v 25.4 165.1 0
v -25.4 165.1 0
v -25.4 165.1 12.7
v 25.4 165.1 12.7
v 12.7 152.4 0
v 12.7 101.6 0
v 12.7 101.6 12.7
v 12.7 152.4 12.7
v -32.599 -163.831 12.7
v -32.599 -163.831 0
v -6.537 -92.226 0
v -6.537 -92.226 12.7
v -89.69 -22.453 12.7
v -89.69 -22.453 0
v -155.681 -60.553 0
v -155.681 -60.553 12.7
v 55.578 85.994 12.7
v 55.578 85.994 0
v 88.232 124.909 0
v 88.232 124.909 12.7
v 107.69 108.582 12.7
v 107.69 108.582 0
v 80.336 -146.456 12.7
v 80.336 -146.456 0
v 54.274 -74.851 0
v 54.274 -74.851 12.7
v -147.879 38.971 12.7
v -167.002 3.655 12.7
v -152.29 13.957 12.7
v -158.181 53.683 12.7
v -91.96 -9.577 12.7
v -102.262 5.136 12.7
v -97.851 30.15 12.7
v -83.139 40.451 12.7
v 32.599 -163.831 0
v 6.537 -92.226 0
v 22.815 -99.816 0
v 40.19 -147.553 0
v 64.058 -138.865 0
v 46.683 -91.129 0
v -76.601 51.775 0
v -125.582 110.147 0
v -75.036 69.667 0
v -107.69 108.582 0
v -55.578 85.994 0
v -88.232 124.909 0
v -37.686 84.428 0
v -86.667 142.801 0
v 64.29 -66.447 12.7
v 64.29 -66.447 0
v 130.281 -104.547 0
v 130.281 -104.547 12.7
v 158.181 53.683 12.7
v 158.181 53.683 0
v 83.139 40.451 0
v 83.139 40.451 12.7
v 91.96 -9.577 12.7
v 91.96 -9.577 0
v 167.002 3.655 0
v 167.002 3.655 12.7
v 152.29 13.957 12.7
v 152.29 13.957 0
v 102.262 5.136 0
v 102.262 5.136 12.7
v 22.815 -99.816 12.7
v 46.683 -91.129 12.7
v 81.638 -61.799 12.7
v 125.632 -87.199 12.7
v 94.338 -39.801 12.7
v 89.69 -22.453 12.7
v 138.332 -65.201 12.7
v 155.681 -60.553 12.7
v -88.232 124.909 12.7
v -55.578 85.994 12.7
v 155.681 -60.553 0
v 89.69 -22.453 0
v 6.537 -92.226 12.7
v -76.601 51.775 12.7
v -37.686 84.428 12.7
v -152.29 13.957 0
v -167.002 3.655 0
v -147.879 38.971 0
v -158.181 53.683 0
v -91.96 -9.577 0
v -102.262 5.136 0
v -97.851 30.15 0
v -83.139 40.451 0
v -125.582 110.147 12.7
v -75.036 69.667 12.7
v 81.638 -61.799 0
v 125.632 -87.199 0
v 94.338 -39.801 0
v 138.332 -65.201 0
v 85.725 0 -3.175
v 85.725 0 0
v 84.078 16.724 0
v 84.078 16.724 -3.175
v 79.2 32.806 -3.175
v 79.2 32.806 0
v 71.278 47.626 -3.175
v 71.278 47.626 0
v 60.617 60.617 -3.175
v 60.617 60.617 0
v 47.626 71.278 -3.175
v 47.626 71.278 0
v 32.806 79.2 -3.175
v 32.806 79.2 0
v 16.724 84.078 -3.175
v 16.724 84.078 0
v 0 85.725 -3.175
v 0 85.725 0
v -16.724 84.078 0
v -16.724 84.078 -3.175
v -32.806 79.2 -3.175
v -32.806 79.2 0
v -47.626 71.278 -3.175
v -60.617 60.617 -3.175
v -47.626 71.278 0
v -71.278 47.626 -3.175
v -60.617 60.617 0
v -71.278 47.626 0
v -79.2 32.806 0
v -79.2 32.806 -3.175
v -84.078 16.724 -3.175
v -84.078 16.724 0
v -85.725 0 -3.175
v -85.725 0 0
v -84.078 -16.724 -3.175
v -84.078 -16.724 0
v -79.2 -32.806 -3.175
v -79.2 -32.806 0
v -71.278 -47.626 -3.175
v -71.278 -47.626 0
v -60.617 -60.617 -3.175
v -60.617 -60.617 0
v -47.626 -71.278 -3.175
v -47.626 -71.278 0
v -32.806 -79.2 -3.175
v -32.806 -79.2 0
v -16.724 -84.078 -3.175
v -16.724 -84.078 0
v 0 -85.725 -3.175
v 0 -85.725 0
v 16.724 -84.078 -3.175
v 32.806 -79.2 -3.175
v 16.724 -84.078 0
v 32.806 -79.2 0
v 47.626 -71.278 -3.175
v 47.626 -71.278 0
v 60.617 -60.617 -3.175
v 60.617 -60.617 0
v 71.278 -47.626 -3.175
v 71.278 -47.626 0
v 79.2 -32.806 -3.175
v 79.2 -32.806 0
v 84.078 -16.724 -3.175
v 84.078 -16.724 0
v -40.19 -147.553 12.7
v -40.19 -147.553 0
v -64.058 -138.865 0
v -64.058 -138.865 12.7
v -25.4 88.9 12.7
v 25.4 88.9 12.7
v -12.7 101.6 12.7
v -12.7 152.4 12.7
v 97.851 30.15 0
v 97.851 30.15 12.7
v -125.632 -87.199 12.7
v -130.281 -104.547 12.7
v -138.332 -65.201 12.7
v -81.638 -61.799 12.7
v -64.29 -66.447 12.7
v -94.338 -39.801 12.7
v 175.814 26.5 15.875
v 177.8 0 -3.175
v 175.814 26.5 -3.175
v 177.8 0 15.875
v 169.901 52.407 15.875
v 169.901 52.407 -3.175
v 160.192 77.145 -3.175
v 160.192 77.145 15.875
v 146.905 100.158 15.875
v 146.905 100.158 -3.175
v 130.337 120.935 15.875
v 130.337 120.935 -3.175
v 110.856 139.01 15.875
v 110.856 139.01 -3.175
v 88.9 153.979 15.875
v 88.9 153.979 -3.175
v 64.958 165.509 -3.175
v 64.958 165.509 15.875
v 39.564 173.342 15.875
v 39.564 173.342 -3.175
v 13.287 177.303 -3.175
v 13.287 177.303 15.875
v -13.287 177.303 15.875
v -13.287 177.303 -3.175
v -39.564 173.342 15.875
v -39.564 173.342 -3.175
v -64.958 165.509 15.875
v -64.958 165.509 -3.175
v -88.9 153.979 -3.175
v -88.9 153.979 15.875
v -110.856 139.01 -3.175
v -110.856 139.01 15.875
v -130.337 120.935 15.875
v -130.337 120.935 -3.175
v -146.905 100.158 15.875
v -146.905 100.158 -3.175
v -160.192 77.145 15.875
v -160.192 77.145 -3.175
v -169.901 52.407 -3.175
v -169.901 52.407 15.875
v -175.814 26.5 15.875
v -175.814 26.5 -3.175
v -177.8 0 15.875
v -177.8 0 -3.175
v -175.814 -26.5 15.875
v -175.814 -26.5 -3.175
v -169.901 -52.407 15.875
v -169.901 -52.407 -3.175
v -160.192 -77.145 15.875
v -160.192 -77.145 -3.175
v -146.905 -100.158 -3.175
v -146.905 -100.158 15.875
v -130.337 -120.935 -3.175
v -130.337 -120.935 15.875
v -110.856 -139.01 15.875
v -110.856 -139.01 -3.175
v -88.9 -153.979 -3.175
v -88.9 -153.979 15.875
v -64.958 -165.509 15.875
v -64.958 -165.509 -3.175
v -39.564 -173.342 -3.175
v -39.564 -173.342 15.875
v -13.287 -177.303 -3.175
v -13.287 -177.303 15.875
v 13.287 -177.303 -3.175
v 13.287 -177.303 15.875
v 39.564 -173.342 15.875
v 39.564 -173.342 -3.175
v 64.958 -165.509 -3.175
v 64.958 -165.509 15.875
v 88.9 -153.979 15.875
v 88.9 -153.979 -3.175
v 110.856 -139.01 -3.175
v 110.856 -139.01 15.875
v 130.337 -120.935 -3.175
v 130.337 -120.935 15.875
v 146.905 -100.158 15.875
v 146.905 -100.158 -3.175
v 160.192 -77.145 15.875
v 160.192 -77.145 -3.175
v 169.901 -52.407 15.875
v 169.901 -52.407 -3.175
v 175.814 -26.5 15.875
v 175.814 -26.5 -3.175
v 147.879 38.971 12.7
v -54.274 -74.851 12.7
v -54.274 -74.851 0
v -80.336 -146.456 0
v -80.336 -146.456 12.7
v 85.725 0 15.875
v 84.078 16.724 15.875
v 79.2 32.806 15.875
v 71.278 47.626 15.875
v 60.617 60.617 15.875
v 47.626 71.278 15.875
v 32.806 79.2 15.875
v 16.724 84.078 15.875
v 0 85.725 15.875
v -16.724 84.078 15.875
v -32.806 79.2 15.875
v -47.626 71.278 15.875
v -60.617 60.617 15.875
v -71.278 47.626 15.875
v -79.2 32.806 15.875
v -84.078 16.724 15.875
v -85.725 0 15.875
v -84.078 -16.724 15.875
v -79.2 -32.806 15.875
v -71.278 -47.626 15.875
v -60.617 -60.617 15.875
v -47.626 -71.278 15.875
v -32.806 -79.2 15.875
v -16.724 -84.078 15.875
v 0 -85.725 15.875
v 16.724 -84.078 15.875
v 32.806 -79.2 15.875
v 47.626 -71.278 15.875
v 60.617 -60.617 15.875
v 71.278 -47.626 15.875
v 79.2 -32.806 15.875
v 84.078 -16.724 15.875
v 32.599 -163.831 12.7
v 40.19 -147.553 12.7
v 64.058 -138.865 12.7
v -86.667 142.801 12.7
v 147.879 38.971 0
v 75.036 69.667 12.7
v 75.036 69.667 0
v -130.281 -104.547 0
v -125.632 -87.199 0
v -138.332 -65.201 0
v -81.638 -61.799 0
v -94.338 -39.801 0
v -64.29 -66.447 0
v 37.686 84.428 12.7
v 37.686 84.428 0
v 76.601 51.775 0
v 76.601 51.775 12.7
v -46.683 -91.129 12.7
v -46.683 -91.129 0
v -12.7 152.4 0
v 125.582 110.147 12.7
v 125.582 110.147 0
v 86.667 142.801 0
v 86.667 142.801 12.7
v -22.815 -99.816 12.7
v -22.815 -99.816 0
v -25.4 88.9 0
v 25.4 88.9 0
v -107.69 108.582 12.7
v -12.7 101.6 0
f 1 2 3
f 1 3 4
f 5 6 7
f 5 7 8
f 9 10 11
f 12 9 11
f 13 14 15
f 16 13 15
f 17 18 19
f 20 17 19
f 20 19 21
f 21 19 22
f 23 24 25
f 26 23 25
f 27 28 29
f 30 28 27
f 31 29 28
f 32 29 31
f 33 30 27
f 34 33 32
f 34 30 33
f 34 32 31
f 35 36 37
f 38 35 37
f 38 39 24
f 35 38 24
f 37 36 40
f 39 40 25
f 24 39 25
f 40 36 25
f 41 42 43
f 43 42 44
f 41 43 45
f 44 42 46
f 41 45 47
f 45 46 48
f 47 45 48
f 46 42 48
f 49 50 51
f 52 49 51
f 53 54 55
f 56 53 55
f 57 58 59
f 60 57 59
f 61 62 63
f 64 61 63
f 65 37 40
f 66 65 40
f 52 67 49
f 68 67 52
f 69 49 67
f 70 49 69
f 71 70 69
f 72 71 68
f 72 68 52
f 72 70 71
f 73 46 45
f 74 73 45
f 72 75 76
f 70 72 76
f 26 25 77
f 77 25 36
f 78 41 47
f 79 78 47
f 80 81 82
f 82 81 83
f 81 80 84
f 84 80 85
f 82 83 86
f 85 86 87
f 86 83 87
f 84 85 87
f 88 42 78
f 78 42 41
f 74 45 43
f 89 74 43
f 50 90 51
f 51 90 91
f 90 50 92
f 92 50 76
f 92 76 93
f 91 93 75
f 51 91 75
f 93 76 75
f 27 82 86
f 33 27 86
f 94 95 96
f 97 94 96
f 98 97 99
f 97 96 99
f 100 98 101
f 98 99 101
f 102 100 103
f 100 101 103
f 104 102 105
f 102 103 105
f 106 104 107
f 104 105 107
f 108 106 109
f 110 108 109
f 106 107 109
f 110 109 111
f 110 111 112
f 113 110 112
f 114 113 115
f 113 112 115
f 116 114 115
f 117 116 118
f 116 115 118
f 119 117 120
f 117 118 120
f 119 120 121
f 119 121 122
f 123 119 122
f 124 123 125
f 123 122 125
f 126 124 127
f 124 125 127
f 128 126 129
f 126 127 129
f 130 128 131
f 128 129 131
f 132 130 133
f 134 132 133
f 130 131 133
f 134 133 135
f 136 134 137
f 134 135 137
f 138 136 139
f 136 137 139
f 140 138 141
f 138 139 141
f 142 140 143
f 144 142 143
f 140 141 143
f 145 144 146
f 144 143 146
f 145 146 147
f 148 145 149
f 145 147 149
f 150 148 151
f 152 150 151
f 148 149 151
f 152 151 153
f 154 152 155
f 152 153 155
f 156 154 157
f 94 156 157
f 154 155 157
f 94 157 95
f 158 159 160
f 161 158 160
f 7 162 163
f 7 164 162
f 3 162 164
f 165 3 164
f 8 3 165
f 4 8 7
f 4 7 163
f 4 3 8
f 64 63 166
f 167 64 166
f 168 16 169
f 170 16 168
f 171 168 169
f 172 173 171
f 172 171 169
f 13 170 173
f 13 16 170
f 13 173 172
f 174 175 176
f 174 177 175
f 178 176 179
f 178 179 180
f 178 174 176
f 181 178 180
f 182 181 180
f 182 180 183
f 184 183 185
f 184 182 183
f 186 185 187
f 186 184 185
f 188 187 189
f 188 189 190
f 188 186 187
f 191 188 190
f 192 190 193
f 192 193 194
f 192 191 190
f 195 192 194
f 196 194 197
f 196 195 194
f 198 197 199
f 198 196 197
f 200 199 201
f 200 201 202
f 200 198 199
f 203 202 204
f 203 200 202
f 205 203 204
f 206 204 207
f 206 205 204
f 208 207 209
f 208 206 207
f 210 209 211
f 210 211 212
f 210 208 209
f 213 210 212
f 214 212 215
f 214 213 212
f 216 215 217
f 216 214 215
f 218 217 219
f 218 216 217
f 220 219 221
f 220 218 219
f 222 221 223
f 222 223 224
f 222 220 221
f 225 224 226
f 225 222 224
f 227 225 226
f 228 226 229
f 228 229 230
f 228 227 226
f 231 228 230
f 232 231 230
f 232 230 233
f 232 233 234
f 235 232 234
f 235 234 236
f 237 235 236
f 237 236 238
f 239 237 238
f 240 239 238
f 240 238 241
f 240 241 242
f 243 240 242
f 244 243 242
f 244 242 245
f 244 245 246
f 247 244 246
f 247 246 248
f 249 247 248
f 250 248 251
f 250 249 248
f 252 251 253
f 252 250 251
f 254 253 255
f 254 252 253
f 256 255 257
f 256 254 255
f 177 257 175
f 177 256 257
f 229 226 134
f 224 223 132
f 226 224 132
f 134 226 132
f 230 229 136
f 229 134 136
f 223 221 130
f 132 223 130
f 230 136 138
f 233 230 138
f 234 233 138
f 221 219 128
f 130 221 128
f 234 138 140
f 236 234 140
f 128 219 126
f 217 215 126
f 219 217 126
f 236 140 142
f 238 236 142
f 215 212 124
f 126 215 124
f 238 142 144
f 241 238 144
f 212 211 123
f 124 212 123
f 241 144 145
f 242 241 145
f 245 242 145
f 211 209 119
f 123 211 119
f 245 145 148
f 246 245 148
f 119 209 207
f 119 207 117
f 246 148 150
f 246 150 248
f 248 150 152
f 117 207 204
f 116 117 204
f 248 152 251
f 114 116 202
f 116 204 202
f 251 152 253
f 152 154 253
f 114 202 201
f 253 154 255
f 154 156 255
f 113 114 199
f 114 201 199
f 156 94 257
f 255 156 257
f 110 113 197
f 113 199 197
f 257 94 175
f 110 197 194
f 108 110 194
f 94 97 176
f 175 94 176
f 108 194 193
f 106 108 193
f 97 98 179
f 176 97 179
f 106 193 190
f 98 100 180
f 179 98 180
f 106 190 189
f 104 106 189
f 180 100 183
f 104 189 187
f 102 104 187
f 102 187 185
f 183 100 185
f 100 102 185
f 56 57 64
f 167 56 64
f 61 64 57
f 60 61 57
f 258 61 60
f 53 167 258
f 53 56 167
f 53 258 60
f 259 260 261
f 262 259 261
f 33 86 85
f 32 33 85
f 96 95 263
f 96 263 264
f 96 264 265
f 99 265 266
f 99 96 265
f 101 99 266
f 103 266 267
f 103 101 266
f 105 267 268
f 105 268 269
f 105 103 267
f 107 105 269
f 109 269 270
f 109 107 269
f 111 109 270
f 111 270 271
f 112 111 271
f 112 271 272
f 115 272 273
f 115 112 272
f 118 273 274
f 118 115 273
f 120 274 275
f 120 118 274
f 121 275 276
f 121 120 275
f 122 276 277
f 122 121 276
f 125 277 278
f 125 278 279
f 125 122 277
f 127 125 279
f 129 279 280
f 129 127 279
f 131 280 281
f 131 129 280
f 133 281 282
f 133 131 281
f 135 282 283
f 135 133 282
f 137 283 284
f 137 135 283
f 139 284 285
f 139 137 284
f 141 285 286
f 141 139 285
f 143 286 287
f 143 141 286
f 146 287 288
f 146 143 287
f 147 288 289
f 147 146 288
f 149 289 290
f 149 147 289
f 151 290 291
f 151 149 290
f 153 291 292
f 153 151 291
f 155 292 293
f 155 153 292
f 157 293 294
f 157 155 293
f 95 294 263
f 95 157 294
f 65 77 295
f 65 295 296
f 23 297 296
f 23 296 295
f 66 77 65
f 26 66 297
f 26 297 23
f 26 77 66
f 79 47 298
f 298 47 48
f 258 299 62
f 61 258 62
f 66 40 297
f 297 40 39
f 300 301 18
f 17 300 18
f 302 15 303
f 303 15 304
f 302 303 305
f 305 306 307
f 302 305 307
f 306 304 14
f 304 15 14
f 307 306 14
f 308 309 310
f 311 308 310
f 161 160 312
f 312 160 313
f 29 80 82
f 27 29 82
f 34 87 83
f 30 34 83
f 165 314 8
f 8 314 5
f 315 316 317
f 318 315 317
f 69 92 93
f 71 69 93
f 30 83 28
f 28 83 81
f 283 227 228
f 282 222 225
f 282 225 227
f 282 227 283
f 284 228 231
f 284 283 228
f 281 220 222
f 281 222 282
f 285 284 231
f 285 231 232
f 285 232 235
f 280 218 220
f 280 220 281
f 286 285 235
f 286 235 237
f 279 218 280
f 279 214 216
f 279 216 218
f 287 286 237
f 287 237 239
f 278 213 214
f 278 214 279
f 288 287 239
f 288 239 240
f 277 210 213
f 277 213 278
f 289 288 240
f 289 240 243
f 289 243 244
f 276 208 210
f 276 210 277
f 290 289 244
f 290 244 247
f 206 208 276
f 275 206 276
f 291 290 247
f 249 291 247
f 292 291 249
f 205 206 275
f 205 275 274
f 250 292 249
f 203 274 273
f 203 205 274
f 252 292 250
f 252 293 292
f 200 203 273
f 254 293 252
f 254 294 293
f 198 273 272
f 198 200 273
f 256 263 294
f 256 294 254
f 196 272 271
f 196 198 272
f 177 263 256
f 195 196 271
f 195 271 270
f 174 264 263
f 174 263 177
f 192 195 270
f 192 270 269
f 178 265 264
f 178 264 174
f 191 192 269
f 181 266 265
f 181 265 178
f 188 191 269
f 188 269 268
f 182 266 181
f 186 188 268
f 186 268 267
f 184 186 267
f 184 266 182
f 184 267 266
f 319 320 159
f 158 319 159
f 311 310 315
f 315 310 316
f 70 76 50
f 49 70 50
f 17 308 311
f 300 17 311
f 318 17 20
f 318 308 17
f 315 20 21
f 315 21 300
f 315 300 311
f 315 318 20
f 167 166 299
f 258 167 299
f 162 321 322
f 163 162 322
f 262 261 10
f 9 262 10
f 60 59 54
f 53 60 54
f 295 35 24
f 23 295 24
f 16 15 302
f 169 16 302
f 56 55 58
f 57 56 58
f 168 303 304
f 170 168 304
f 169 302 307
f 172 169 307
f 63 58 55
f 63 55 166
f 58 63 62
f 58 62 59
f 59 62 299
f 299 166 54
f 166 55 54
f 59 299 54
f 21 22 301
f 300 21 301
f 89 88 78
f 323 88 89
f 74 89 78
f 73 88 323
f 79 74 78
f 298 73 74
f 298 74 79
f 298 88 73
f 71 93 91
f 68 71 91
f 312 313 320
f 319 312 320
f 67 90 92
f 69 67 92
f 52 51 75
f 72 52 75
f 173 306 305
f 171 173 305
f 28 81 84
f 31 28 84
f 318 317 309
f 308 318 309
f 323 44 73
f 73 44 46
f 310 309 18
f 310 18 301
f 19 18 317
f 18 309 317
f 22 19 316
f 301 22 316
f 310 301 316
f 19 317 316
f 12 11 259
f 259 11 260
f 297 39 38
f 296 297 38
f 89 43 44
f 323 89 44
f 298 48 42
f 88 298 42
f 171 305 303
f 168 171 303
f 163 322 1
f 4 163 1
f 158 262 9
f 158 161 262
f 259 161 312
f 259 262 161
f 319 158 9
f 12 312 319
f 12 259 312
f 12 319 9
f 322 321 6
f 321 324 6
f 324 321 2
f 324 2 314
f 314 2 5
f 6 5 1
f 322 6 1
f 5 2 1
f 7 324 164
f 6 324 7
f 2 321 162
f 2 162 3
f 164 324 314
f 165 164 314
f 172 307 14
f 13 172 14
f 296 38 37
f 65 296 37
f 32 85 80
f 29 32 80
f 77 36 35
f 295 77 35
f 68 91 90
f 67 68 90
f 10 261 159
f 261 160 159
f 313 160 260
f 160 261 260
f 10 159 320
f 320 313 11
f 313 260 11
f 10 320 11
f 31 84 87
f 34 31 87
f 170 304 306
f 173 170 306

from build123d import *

# Parameters (mm, degrees)
F1_DEPTH      = 12.7
F0_W          = 50.8
F0_H          = 76.2
F0_W_2        = 25.4
F0_H_2        = 50.8
F2_R          = 177.8
F2_R_2        = 85.725
F3_DEPTH      = 15.875
F3_DEPTH_BACK = 3.175


# Not quite as in the source:
# - a feature names something its author has since deleted; it is built from what else it names


with BuildPart() as f1:
    # F0 (on Top) → F1 (new body)
    with BuildSketch(Plane.XY):
        Polygon((-76.6013473564, 51.7745457072), (-37.6862896459, 84.4281562793), (-86.666705504, 142.800742845), (-125.5817632145, 110.1471322729), align=None)
        Polygon((-107.6895961438, 108.5817704883), (-88.2320672886, 124.9085757744), (-55.5784567165, 85.9935180639), (-75.0359855718, 69.6667127779), align=None, mode=Mode.SUBTRACT)
    extrude(amount=F1_DEPTH)


with BuildPart() as f1b:
    # F0 (on Top) → F1, piece 2 (new body)
    with BuildSketch(Plane.XY):
        with Locations((0, 127)):
            Rectangle(F0_W, F0_H)
        with Locations((0, 127)):
            Rectangle(F0_W_2, F0_H_2, mode=Mode.SUBTRACT)
    extrude(amount=F1_DEPTH)


with BuildPart() as f1c:
    # F0 (on Top) → F1, piece 3 (new body)
    with BuildSketch(Plane.XY):
        Polygon((-91.9600729555, -9.5767939319), (-83.13874553, 40.4514399211), (-158.1810963096, 53.6834310593), (-167.0024237351, 3.6551972063), align=None)
        Polygon((-152.2900334154, 13.9569238132), (-147.8793697027, 38.9710407397), (-97.8511358497, 30.1497133142), (-102.2617995624, 5.1355963877), align=None, mode=Mode.SUBTRACT)
    extrude(amount=F1_DEPTH)


with BuildPart() as f1d:
    # F0 (on Top) → F1, piece 4 (new body)
    with BuildSketch(Plane.XY):
        Polygon((37.6862896459, 84.4281562793), (76.6013473564, 51.7745457072), (125.5817632145, 110.1471322729), (86.666705504, 142.800742845), align=None)
        Polygon((88.2320672886, 124.9085757744), (107.6895961438, 108.5817704883), (75.0359855718, 69.6667127779), (55.5784567165, 85.9935180639), align=None, mode=Mode.SUBTRACT)
    extrude(amount=F1_DEPTH)


with BuildPart() as f1e:
    # F0 (on Top) → F1, piece 5 (new body)
    with BuildSketch(Plane.XY):
        Polygon((83.13874553, 40.4514399211), (91.9600729555, -9.5767939319), (167.0024237351, 3.6551972063), (158.1810963096, 53.6834310593), align=None)
        Polygon((147.8793697027, 38.9710407397), (152.2900334154, 13.9569238132), (102.2617995624, 5.1355963877), (97.8511358497, 30.1497133142), align=None, mode=Mode.SUBTRACT)
    extrude(amount=F1_DEPTH)


with BuildPart() as f1f:
    # F0 (on Top) → F1, piece 6 (new body)
    with BuildSketch(Plane.XY):
        Polygon((89.6896583964, -22.4529547439), (64.2896583964, -66.4470452561), (130.2807941648, -104.5470452561), (155.6807941648, -60.5529547439), align=None)
        Polygon((138.3322715367, -65.2014773719), (125.6322715367, -87.1985226281), (81.6381810245, -61.7985226281), (94.3381810245, -39.8014773719), align=None, mode=Mode.SUBTRACT)
    extrude(amount=F1_DEPTH)


with BuildPart() as f1g:
    # F0 (on Top) → F1, piece 7 (new body)
    with BuildSketch(Plane.XY):
        Polygon((54.2737833096, -74.8513623474), (6.5373981737, -92.2259856283), (32.5993330951, -163.8305633322), (80.335718231, -146.4559400513), align=None)
        Polygon((64.0579661268, -138.8654995875), (40.1897735589, -147.552811228), (22.8151502779, -99.8164260921), (46.6833428459, -91.1291144516), align=None, mode=Mode.SUBTRACT)
    extrude(amount=F1_DEPTH)


with BuildPart() as f1h:
    # F0 (on Top) → F1, piece 8 (new body)
    with BuildSketch(Plane.XY):
        Polygon((-6.5373981737, -92.2259856283), (-54.2737833096, -74.8513623474), (-80.335718231, -146.4559400513), (-32.5993330951, -163.8305633322), align=None)
        Polygon((-40.1897735589, -147.552811228), (-64.0579661268, -138.8654995875), (-46.6833428459, -91.1291144516), (-22.8151502779, -99.8164260921), align=None, mode=Mode.SUBTRACT)
    extrude(amount=F1_DEPTH)


with BuildPart() as f1i:
    # F0 (on Top) → F1, piece 9 (new body)
    with BuildSketch(Plane.XY):
        Polygon((-64.2896583964, -66.4470452561), (-89.6896583964, -22.4529547439), (-155.6807941648, -60.5529547439), (-130.2807941648, -104.5470452561), align=None)
        Polygon((-125.6322715367, -87.1985226281), (-138.3322715367, -65.2014773719), (-94.3381810245, -39.8014773719), (-81.6381810245, -61.7985226281), align=None, mode=Mode.SUBTRACT)
    extrude(amount=F1_DEPTH)


with BuildPart() as f3:
    # F2 (on Top) → F3 (new body, two sides)
    with BuildSketch(Plane.XY) as f3_sk:
        Circle(F2_R)
        Circle(F2_R_2, mode=Mode.SUBTRACT)
    extrude(amount=F3_DEPTH)
    extrude(f3_sk.sketch, amount=-F3_DEPTH_BACK)


solid = Compound([f1.part, f1b.part, f1c.part, f1d.part, f1e.part, f1f.part, f1g.part, f1h.part, f1i.part, f3.part])
